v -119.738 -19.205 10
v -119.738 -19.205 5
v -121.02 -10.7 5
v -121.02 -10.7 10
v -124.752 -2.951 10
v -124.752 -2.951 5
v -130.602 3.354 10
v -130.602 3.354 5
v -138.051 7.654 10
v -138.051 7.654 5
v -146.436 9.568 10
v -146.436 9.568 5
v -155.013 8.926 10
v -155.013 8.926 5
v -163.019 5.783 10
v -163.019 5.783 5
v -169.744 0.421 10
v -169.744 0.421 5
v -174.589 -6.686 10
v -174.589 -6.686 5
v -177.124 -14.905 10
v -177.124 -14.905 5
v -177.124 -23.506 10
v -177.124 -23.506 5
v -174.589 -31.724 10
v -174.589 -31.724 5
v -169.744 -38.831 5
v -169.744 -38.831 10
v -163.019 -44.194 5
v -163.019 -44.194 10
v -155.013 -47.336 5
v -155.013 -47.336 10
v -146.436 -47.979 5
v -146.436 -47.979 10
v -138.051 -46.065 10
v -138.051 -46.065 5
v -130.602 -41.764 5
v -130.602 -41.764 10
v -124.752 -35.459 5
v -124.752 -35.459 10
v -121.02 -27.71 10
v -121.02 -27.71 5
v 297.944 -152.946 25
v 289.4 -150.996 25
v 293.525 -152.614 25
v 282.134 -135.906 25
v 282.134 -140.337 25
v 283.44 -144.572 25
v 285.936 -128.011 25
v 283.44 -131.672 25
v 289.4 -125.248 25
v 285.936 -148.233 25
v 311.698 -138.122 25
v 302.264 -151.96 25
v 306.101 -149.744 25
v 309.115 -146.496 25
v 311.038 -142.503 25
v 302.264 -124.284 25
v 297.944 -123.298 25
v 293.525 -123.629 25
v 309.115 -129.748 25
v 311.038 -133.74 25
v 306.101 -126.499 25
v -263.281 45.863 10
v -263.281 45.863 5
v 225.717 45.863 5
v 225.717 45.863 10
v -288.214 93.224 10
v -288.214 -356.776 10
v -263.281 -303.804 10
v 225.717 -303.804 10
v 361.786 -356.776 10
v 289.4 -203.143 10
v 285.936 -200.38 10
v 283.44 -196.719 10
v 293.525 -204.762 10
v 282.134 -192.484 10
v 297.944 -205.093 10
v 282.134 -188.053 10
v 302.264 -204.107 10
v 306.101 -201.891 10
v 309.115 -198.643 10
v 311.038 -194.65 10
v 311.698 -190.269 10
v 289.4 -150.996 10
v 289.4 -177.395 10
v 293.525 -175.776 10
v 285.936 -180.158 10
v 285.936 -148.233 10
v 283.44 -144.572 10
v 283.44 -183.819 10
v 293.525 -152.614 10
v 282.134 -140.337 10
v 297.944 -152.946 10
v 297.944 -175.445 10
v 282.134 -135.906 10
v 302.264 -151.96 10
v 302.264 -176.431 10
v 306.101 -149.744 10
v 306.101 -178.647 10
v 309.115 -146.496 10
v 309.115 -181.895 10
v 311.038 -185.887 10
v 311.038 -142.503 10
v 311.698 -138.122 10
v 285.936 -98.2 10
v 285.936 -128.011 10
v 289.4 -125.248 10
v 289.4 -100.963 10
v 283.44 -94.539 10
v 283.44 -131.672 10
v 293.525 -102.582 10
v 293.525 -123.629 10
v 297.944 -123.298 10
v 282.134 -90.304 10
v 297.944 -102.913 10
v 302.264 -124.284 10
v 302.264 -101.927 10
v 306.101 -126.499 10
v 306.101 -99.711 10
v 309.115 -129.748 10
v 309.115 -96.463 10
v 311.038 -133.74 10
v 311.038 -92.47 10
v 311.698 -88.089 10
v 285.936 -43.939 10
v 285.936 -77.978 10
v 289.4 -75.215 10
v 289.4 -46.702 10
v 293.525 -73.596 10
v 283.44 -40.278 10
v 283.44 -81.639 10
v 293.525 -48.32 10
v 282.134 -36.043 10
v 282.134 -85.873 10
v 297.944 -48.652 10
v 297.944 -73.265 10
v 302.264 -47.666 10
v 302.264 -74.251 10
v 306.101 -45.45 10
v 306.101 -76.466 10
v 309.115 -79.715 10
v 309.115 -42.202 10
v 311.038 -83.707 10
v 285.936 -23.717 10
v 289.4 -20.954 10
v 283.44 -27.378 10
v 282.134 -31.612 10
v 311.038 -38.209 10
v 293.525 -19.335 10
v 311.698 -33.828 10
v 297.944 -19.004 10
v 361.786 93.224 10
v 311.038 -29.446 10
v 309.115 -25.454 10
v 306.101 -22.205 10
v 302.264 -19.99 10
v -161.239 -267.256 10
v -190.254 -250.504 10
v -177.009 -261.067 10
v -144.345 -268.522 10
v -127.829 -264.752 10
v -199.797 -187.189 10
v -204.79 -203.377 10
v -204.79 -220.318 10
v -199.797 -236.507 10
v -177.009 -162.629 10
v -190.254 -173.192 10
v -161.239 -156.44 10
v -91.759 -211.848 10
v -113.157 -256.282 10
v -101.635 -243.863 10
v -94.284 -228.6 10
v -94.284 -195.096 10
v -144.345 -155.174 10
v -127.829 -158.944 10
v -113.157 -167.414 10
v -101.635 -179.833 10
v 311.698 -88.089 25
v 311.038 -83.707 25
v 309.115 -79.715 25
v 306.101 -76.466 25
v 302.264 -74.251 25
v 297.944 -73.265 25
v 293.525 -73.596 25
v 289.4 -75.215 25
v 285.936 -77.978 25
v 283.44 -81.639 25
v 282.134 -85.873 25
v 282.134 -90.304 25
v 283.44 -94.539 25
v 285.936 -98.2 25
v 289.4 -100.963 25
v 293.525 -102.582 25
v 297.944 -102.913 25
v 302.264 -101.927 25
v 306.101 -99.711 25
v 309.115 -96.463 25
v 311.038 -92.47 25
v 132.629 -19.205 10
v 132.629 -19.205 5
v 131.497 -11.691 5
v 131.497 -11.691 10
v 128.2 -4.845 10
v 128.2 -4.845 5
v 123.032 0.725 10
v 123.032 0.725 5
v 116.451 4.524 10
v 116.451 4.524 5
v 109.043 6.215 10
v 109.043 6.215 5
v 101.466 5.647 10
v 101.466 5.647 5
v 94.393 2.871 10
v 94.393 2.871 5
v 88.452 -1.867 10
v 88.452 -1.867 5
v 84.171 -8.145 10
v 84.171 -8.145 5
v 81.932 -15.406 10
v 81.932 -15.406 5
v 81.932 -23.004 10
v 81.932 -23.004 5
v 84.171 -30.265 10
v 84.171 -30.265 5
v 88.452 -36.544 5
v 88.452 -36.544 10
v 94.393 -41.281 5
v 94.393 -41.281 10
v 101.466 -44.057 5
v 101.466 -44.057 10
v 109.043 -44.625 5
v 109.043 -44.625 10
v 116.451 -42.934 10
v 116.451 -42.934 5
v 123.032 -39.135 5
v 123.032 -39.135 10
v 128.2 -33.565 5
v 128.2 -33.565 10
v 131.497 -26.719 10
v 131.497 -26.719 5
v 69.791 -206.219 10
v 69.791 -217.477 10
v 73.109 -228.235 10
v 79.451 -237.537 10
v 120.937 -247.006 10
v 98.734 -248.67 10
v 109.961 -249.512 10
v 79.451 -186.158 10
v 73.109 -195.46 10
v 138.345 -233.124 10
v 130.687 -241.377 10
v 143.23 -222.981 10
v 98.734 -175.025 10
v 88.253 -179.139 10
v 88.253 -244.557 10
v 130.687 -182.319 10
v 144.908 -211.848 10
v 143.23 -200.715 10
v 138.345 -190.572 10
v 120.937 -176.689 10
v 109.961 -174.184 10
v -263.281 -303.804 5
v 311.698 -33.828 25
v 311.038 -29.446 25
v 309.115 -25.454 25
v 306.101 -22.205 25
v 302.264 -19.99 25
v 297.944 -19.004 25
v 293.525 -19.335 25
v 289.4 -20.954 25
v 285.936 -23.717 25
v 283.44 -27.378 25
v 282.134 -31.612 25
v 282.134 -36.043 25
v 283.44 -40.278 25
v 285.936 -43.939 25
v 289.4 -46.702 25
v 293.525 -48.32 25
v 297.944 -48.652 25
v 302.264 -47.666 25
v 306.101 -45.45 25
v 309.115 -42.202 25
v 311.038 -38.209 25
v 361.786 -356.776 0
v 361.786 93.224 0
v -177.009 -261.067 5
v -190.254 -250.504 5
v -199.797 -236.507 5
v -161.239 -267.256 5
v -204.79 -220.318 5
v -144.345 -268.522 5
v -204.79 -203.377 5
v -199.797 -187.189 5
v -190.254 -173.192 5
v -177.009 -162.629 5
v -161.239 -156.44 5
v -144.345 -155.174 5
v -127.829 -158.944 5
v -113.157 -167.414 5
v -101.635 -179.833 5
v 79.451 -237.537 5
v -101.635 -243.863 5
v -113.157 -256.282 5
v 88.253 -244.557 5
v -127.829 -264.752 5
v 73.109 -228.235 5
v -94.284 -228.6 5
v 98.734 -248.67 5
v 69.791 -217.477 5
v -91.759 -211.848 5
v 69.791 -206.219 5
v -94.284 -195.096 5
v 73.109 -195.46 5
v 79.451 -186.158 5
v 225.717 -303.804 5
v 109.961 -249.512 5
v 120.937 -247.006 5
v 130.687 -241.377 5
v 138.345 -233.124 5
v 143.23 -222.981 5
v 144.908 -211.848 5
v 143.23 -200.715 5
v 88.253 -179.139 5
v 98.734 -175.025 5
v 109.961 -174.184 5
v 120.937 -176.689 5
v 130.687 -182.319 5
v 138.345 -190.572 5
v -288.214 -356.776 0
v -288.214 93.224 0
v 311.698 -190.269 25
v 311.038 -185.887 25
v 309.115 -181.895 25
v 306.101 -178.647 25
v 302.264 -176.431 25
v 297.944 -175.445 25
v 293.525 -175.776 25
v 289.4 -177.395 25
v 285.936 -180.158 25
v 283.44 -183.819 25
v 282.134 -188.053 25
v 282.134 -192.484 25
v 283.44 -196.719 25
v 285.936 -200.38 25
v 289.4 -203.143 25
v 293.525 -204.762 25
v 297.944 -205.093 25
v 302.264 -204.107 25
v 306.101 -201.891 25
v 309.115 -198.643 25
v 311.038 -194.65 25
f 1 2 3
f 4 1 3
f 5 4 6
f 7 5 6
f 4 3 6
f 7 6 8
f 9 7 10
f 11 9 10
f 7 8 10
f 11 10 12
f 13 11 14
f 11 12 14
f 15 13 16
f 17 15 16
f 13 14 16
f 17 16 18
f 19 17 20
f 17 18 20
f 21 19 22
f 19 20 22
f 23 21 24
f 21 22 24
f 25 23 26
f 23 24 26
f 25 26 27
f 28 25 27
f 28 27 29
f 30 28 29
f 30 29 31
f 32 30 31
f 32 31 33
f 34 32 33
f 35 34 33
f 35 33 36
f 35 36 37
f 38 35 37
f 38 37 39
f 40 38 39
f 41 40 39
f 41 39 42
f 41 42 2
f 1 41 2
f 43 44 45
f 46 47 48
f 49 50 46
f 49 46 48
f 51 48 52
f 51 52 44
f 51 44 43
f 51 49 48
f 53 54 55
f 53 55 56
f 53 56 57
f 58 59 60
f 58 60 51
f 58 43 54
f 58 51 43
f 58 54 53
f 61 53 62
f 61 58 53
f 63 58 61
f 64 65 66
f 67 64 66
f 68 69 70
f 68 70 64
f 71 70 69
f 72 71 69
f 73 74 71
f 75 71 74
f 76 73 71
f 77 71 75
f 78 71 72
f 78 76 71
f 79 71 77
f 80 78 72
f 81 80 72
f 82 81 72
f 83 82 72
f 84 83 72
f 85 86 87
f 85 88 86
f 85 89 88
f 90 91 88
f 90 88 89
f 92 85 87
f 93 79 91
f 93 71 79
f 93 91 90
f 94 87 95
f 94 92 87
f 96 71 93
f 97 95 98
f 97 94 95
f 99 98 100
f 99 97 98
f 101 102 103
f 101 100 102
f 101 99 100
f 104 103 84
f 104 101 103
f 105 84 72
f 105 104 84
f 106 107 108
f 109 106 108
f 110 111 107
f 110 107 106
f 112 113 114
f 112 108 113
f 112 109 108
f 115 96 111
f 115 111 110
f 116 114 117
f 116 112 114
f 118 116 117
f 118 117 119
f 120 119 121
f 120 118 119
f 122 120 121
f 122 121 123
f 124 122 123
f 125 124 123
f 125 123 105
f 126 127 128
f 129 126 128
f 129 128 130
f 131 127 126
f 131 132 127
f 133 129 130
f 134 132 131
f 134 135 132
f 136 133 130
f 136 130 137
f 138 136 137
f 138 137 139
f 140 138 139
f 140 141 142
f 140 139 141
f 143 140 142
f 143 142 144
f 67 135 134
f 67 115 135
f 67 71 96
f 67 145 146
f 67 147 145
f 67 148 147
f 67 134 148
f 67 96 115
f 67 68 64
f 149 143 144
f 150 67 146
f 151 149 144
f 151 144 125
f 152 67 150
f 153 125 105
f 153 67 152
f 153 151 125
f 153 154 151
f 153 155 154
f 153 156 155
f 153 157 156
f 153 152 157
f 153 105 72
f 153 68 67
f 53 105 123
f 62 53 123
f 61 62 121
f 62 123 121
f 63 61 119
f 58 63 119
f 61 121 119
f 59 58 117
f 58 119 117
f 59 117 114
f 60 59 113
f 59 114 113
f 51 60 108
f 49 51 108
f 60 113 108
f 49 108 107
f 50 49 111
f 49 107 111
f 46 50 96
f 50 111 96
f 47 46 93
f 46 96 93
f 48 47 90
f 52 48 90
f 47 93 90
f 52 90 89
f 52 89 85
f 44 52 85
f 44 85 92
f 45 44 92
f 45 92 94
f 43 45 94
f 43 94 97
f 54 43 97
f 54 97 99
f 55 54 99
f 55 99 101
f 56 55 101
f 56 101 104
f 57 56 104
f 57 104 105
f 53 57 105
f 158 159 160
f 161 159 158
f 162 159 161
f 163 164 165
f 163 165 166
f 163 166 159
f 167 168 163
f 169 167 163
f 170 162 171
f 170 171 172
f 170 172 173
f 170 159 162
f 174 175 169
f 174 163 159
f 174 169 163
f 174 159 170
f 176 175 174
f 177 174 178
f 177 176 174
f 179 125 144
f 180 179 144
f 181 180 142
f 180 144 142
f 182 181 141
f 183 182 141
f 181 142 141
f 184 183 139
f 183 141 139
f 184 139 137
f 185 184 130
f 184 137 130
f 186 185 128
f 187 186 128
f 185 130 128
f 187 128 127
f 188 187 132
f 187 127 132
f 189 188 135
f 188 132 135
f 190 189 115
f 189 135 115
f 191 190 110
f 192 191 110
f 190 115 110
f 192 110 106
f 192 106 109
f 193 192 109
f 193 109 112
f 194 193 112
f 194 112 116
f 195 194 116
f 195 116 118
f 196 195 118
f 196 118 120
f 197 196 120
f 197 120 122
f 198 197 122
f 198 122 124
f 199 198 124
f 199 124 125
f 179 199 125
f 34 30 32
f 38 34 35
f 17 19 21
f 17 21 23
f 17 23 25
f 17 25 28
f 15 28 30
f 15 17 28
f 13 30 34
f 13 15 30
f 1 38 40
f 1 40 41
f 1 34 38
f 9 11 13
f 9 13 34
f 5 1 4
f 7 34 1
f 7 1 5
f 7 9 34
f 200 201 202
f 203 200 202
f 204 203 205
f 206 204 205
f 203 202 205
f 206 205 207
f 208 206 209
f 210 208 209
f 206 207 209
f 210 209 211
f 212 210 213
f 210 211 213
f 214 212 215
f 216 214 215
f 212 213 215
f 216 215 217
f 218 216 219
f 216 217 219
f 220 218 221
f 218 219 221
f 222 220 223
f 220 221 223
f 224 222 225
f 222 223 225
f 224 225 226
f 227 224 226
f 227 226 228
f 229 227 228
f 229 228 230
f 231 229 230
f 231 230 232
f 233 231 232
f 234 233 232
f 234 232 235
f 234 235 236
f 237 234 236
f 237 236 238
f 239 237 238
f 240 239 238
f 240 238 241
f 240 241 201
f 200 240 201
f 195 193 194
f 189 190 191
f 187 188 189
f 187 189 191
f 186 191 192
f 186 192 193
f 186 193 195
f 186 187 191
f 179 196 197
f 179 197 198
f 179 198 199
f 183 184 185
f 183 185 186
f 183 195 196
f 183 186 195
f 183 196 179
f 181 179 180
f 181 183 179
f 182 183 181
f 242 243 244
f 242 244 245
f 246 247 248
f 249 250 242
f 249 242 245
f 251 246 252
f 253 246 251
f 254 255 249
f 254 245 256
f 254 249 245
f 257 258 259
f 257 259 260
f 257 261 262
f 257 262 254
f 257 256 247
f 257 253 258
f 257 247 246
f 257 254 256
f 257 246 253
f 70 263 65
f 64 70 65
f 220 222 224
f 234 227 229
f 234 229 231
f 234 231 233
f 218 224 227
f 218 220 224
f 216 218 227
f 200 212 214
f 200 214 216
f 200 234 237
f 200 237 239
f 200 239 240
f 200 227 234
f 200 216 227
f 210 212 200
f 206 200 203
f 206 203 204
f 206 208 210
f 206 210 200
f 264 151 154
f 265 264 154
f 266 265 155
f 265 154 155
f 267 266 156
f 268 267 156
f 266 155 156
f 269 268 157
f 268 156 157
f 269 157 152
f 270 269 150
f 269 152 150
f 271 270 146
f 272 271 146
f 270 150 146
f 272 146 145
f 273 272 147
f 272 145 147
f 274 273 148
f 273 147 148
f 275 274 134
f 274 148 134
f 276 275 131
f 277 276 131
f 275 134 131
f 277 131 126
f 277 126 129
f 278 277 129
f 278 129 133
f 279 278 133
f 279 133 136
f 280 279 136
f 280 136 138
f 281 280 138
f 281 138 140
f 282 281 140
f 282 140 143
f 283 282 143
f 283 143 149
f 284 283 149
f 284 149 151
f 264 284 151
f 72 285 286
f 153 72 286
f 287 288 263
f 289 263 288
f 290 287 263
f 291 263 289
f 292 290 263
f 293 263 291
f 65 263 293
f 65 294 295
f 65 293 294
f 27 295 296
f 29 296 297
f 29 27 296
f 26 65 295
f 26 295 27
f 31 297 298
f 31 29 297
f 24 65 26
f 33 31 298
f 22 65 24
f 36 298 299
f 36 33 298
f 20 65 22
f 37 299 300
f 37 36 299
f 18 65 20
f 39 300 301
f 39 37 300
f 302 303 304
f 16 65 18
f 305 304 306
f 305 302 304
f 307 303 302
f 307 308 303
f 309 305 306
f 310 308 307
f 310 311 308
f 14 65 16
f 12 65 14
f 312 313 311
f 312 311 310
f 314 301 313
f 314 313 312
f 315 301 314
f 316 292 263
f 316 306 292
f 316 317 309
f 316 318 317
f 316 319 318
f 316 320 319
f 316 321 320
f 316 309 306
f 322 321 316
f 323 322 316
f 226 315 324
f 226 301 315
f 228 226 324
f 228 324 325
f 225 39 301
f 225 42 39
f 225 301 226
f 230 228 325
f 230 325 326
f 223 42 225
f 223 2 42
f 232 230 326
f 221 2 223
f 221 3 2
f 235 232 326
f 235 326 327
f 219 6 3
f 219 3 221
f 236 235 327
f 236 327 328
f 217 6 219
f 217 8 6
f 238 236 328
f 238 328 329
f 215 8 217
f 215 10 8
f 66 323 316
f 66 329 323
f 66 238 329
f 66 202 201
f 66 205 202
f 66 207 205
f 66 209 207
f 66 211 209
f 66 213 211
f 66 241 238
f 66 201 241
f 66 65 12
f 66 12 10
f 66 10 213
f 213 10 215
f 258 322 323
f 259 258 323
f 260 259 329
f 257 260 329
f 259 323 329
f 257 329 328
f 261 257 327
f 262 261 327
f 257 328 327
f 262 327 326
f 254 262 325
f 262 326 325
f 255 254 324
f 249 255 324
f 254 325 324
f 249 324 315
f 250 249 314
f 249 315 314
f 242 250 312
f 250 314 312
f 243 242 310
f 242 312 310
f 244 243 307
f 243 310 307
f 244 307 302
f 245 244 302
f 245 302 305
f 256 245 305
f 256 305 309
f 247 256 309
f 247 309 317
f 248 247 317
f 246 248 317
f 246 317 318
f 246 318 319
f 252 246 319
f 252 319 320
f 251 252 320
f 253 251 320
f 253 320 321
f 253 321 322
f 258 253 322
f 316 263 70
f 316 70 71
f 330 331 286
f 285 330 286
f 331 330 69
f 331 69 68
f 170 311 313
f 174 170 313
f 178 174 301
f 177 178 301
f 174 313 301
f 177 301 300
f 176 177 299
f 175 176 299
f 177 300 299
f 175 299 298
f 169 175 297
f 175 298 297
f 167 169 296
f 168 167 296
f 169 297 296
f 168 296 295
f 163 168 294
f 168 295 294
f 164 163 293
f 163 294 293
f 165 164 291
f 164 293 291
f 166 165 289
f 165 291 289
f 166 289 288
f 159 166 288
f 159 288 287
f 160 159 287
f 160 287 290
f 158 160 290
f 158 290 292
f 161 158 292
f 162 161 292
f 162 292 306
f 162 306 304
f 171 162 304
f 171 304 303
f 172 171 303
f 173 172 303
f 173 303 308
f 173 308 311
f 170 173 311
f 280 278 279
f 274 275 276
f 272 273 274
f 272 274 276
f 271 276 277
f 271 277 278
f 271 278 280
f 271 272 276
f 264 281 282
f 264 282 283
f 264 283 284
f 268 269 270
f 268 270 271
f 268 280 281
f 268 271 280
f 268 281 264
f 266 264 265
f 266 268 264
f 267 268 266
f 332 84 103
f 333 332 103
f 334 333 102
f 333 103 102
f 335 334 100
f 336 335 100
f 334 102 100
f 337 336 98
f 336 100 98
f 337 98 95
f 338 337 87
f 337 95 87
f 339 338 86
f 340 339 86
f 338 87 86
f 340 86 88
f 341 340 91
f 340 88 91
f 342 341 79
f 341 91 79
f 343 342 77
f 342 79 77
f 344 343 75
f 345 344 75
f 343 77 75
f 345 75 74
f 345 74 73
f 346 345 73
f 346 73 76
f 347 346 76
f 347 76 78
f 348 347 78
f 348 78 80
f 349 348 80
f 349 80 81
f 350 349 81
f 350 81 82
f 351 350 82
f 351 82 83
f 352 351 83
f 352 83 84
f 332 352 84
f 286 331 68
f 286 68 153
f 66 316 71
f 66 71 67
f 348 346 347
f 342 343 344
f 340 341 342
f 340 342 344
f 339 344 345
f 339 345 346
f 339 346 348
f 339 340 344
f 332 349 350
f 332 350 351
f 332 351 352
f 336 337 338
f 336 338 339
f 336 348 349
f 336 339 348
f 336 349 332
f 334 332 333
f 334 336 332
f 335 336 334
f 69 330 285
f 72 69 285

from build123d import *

# Parameters (mm, degrees)
F0_W     = 650
F0_H     = 450
F0_R     = 14.865454
F0_W_2   = 488.997654
F0_H_2   = 349.666808
F1_DEPTH = 10
F0_R_2   = 56.832951
F0_R_3   = 37.769343
F0_R_4   = 28.854156
F0_R_5   = 25.491264
F2_DEPTH = 5
F3_DEPTH = 10
F4_DEPTH = 25


with BuildPart() as f1:
    # F0 (on Top) → F1 (new body)
    with BuildSketch(Plane.XY):
        with Locations((36.786486, -131.776476)):
            Rectangle(F0_W, F0_H)
        with Locations((296.833038, -190.268785)):
            Circle(F0_R, mode=Mode.SUBTRACT)
        with Locations((296.833038, -138.121739)):
            Circle(F0_R, mode=Mode.SUBTRACT)
        with Locations((-18.782042, -128.970219)):
            Rectangle(F0_W_2, F0_H_2, mode=Mode.SUBTRACT)
        with Locations((296.833038, -88.088758)):
            Circle(F0_R, mode=Mode.SUBTRACT)
        with Locations((296.833038, -33.827644)):
            Circle(F0_R, mode=Mode.SUBTRACT)
    extrude(amount=F1_DEPTH)

    # F0 (on Top) → F2 (join)
    with BuildSketch(Plane.XY):
        with Locations((-18.782042, -128.970219)):
            Rectangle(F0_W_2, F0_H_2)
        with Locations((-148.592174, -211.847812)):
            Circle(F0_R_2, mode=Mode.SUBTRACT)
        with Locations((107.138157, -211.847812)):
            Circle(F0_R_3, mode=Mode.SUBTRACT)
        with Locations((-148.592174, -19.205136)):
            Circle(F0_R_4, mode=Mode.SUBTRACT)
        with Locations((107.138157, -19.205136)):
            Circle(F0_R_5, mode=Mode.SUBTRACT)
    extrude(amount=F2_DEPTH)

    # F0 (on Top) → F3 (join)
    with BuildSketch(Plane.XY):
        with Locations((-148.592174, -19.205136)):
            Circle(F0_R_4)
        with Locations((107.138157, -19.205136)):
            Circle(F0_R_5)
        with Locations((107.138157, -211.847812)):
            Circle(F0_R_3)
        with Locations((-148.592174, -211.847812)):
            Circle(F0_R_2)
    extrude(amount=F3_DEPTH)

    # F0 (on Top) → F4 (join)
    with BuildSketch(Plane.XY):
        with Locations((296.833038, -33.827644)):
            Circle(F0_R)
        with Locations((296.833038, -88.088758)):
            Circle(F0_R)
        with Locations((296.833038, -138.121739)):
            Circle(F0_R)
        with Locations((296.833038, -190.268785)):
            Circle(F0_R)
    extrude(amount=F4_DEPTH)


solid = f1.part
